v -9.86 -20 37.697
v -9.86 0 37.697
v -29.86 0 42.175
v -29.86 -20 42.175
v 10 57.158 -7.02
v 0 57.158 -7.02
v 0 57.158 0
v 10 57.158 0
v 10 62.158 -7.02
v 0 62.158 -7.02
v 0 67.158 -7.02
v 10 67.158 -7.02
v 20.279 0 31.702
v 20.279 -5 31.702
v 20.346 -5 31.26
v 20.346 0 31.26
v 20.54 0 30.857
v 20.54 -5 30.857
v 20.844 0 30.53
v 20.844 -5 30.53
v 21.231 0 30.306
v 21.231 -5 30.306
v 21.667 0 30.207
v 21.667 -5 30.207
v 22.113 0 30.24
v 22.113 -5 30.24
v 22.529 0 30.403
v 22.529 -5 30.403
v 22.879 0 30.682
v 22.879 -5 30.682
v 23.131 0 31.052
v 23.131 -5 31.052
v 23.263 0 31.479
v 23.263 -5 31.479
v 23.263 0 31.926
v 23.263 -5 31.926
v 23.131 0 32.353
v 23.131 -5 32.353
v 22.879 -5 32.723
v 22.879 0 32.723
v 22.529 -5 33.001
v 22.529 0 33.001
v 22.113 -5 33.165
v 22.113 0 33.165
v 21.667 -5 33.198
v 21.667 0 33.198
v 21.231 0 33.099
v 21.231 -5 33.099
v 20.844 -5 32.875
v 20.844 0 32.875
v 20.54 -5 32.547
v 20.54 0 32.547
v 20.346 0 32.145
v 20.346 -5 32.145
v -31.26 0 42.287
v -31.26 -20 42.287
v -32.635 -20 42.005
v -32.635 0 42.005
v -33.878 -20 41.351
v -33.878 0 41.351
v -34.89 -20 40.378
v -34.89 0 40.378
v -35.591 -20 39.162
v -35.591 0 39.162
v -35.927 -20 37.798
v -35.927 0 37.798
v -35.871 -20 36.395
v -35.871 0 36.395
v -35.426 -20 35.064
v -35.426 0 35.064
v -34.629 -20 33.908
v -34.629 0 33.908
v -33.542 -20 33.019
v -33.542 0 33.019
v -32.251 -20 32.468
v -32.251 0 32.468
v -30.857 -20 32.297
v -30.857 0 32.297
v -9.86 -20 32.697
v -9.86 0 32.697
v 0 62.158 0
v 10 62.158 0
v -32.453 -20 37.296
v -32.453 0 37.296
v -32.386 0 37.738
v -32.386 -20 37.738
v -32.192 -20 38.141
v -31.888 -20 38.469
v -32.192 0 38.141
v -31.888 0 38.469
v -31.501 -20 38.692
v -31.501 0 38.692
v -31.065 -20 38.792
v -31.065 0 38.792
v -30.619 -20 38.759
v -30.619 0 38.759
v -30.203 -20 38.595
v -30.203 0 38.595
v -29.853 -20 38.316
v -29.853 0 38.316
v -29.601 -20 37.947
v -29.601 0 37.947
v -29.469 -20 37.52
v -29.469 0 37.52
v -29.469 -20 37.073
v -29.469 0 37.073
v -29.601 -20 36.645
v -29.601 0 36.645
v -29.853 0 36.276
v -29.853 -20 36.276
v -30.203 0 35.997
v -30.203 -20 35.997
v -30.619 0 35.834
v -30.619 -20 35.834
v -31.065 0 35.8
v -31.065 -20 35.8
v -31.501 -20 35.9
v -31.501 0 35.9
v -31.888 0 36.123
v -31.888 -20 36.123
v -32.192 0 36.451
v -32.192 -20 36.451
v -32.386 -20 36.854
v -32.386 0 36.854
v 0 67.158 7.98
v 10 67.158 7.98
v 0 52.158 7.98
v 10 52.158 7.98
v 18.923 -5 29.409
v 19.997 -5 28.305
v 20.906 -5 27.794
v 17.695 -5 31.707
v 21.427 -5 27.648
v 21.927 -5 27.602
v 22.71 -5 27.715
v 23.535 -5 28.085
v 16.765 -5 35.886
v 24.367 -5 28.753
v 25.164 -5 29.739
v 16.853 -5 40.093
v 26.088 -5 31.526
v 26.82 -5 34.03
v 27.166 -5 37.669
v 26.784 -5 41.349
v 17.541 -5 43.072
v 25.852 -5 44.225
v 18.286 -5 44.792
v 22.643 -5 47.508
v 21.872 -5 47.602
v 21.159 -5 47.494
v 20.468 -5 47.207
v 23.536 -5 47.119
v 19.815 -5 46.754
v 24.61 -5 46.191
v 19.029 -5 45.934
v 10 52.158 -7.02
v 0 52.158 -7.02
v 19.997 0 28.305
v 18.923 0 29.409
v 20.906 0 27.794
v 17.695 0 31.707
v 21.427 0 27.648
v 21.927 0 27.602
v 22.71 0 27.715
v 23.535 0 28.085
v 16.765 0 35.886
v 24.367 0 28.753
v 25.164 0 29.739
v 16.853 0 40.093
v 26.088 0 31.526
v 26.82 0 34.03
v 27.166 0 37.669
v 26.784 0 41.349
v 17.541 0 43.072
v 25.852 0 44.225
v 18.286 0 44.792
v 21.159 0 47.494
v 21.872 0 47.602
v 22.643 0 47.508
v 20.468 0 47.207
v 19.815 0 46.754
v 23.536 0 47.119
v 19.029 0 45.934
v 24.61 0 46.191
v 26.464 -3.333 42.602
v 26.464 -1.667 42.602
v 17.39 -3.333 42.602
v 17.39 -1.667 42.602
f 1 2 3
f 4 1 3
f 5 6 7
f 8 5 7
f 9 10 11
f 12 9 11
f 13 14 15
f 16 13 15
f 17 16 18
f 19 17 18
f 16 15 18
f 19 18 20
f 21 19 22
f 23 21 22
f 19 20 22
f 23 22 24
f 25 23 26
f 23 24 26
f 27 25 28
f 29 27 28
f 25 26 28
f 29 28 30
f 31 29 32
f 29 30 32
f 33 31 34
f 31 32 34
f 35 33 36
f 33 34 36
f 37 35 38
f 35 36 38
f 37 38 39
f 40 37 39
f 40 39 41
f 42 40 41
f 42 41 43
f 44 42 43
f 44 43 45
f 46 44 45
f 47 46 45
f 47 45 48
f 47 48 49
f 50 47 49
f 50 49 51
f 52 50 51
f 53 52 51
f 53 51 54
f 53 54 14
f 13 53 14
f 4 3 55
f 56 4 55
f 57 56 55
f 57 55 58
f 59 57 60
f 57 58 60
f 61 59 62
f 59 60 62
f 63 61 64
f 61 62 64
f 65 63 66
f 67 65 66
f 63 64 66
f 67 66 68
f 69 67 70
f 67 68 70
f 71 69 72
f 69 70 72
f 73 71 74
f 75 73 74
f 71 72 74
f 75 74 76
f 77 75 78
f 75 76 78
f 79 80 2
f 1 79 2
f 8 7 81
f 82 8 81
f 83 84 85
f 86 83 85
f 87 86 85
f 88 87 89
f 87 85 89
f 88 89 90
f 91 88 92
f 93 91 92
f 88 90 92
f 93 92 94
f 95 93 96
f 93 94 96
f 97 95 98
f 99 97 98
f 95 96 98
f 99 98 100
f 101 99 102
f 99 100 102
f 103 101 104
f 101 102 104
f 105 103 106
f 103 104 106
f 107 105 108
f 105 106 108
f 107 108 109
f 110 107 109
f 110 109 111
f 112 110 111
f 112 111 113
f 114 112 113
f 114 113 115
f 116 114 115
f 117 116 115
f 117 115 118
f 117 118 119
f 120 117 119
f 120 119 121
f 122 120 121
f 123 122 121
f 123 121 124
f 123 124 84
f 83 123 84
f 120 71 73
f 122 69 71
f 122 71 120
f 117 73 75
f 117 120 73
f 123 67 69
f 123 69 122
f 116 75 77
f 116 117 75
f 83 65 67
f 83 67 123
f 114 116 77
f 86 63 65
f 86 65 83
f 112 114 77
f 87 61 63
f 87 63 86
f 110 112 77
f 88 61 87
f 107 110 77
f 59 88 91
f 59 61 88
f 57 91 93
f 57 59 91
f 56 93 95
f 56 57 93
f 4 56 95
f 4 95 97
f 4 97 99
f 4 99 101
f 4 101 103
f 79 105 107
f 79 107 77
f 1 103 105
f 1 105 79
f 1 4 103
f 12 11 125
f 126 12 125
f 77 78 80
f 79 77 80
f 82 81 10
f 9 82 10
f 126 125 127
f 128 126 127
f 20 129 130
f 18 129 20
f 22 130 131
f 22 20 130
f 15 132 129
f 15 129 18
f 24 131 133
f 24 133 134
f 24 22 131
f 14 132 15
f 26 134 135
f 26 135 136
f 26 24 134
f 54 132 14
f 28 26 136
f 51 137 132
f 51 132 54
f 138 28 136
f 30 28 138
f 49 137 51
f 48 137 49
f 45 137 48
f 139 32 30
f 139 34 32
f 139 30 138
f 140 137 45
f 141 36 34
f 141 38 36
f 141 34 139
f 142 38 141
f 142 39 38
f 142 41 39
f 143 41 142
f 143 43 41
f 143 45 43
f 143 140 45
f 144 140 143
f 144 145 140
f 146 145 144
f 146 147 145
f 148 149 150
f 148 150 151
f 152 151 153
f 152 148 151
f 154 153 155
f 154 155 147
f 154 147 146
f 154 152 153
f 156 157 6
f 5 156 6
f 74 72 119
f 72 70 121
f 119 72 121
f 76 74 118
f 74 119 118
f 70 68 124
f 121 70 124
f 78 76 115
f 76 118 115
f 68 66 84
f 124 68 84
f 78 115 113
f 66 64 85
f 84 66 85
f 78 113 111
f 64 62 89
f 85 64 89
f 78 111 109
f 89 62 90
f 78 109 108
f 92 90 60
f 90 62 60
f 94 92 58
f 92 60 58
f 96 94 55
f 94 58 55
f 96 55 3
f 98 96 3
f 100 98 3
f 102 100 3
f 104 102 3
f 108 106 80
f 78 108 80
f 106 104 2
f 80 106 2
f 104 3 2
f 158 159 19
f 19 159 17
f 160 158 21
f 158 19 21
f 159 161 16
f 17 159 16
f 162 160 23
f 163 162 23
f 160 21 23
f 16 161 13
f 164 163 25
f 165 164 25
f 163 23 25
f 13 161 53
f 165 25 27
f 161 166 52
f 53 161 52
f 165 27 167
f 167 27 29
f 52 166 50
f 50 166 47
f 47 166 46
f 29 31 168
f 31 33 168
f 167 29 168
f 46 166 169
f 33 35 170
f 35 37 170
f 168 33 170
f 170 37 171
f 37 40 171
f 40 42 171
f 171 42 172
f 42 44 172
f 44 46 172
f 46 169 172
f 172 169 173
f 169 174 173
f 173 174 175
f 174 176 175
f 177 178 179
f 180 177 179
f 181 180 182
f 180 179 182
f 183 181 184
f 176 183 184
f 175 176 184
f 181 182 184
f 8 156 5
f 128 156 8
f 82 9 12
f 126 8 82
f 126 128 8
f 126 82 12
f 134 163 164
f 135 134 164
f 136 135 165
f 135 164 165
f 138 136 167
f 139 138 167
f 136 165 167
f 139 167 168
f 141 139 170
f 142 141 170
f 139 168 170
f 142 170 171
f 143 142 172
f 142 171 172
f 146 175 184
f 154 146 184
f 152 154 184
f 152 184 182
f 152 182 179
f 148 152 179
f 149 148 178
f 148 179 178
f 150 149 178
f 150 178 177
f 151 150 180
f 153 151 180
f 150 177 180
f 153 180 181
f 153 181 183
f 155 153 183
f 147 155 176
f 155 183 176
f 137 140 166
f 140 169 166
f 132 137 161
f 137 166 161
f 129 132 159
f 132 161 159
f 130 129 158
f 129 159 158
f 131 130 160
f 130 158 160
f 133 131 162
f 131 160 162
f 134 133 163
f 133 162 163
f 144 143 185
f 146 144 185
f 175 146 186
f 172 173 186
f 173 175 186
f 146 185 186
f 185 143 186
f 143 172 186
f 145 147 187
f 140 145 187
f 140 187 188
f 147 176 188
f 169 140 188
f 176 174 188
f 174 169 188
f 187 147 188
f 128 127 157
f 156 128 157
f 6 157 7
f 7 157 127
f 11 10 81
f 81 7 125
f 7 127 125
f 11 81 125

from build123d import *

# Parameters (mm, degrees)
F1_DEPTH = 20
F3_D     = 3
F6_DEPTH = 5
F7_D     = 3
F9_DEPTH = 10


with BuildPart() as f1:
    # F0 (on Front) → F1 (new body)
    with BuildSketch(Plane.XZ):
        with BuildLine():
            ThreePointArc((-30.8573386087, 32.2970444928), (-27.3835041522, 33.7944237341), (-25.9525371099, 37.2961381352))
            ThreePointArc((-25.9525371099, 37.2961381352), (-27.0497984586, 40.4216190614), (-29.8599895179, 42.1753122209))
            ThreePointArc((-29.8599895179, 42.1753122209), (-35.9272459981, 37.7984044761), (-30.8573386087, 32.2970444928))
        make_face()
        with BuildLine():
            ThreePointArc((-29.8599895179, 42.1753122209), (-27.0497984586, 40.4216190614), (-25.9525371099, 37.2961381352))
            ThreePointArc((-25.9525371099, 37.2961381352), (-27.3835041522, 33.7944237341), (-30.8573386087, 32.2970444928))
            Line((-30.8573386087, 32.2970444928), (-9.8599895179, 32.6969002077))
            Line((-9.8599895179, 32.6969002077), (-9.8599895179, 37.6969002077))
            Line((-9.8599895179, 37.6969002077), (-29.8599895179, 42.1753122209))
        make_face()
    extrude(amount=F1_DEPTH)

    # F3 (through all)
    with Locations(Plane.XZ.offset(20)):
        with Locations((-30.9525371099, 37.2961381352)):
            Hole(F3_D / 2)


with BuildPart() as f6:
    # F4 (on Front) → F6 (new body)
    with BuildSketch(Plane.XZ):
        with BuildLine():
            add(Edge.make_bspline(
                [(21.926837042, 27.6021936536), (31.0012587847, 27.6021936536), (26.4640479133, 42.6021936536), (21.926837042, 57.6021936536), (17.3896261706, 42.6021936536), (12.8524152992, 27.6021936536), (21.926837042, 27.6021936536)],
                knots=[0, 0, 0, 2.0943951024, 2.0943951024, 4.1887902048, 4.1887902048, 6.2831853072, 6.2831853072, 6.2831853072], degree=2, weights=[1, 0.5, 1, 0.5, 1, 0.5, 1]))
        make_face()
    extrude(amount=F6_DEPTH)

    # F7 (through all)
    with Locations(Plane(origin=(0, 0, 0), x_dir=(1, 0, 0), z_dir=(0, 1, 0))):
        with Locations((21.7793770134, -31.7023918033)):
            Hole(F7_D / 2)


with BuildPart() as f9:
    # F8 (on Right) → F9 (new body)
    with BuildSketch(Plane.YZ):
        Polygon((57.1578788757, 0), (62.1578788757, 0), (62.1578788757, -7.0202852738), (67.1578788757, -7.0202852738), (67.1578788757, 7.9797147262), (52.1578788757, 7.9797147262), (52.1578788757, -7.0202852738), (57.1578788757, -7.0202852738), align=None)
    extrude(amount=F9_DEPTH)


solid = Compound([f1.part, f6.part, f9.part])
